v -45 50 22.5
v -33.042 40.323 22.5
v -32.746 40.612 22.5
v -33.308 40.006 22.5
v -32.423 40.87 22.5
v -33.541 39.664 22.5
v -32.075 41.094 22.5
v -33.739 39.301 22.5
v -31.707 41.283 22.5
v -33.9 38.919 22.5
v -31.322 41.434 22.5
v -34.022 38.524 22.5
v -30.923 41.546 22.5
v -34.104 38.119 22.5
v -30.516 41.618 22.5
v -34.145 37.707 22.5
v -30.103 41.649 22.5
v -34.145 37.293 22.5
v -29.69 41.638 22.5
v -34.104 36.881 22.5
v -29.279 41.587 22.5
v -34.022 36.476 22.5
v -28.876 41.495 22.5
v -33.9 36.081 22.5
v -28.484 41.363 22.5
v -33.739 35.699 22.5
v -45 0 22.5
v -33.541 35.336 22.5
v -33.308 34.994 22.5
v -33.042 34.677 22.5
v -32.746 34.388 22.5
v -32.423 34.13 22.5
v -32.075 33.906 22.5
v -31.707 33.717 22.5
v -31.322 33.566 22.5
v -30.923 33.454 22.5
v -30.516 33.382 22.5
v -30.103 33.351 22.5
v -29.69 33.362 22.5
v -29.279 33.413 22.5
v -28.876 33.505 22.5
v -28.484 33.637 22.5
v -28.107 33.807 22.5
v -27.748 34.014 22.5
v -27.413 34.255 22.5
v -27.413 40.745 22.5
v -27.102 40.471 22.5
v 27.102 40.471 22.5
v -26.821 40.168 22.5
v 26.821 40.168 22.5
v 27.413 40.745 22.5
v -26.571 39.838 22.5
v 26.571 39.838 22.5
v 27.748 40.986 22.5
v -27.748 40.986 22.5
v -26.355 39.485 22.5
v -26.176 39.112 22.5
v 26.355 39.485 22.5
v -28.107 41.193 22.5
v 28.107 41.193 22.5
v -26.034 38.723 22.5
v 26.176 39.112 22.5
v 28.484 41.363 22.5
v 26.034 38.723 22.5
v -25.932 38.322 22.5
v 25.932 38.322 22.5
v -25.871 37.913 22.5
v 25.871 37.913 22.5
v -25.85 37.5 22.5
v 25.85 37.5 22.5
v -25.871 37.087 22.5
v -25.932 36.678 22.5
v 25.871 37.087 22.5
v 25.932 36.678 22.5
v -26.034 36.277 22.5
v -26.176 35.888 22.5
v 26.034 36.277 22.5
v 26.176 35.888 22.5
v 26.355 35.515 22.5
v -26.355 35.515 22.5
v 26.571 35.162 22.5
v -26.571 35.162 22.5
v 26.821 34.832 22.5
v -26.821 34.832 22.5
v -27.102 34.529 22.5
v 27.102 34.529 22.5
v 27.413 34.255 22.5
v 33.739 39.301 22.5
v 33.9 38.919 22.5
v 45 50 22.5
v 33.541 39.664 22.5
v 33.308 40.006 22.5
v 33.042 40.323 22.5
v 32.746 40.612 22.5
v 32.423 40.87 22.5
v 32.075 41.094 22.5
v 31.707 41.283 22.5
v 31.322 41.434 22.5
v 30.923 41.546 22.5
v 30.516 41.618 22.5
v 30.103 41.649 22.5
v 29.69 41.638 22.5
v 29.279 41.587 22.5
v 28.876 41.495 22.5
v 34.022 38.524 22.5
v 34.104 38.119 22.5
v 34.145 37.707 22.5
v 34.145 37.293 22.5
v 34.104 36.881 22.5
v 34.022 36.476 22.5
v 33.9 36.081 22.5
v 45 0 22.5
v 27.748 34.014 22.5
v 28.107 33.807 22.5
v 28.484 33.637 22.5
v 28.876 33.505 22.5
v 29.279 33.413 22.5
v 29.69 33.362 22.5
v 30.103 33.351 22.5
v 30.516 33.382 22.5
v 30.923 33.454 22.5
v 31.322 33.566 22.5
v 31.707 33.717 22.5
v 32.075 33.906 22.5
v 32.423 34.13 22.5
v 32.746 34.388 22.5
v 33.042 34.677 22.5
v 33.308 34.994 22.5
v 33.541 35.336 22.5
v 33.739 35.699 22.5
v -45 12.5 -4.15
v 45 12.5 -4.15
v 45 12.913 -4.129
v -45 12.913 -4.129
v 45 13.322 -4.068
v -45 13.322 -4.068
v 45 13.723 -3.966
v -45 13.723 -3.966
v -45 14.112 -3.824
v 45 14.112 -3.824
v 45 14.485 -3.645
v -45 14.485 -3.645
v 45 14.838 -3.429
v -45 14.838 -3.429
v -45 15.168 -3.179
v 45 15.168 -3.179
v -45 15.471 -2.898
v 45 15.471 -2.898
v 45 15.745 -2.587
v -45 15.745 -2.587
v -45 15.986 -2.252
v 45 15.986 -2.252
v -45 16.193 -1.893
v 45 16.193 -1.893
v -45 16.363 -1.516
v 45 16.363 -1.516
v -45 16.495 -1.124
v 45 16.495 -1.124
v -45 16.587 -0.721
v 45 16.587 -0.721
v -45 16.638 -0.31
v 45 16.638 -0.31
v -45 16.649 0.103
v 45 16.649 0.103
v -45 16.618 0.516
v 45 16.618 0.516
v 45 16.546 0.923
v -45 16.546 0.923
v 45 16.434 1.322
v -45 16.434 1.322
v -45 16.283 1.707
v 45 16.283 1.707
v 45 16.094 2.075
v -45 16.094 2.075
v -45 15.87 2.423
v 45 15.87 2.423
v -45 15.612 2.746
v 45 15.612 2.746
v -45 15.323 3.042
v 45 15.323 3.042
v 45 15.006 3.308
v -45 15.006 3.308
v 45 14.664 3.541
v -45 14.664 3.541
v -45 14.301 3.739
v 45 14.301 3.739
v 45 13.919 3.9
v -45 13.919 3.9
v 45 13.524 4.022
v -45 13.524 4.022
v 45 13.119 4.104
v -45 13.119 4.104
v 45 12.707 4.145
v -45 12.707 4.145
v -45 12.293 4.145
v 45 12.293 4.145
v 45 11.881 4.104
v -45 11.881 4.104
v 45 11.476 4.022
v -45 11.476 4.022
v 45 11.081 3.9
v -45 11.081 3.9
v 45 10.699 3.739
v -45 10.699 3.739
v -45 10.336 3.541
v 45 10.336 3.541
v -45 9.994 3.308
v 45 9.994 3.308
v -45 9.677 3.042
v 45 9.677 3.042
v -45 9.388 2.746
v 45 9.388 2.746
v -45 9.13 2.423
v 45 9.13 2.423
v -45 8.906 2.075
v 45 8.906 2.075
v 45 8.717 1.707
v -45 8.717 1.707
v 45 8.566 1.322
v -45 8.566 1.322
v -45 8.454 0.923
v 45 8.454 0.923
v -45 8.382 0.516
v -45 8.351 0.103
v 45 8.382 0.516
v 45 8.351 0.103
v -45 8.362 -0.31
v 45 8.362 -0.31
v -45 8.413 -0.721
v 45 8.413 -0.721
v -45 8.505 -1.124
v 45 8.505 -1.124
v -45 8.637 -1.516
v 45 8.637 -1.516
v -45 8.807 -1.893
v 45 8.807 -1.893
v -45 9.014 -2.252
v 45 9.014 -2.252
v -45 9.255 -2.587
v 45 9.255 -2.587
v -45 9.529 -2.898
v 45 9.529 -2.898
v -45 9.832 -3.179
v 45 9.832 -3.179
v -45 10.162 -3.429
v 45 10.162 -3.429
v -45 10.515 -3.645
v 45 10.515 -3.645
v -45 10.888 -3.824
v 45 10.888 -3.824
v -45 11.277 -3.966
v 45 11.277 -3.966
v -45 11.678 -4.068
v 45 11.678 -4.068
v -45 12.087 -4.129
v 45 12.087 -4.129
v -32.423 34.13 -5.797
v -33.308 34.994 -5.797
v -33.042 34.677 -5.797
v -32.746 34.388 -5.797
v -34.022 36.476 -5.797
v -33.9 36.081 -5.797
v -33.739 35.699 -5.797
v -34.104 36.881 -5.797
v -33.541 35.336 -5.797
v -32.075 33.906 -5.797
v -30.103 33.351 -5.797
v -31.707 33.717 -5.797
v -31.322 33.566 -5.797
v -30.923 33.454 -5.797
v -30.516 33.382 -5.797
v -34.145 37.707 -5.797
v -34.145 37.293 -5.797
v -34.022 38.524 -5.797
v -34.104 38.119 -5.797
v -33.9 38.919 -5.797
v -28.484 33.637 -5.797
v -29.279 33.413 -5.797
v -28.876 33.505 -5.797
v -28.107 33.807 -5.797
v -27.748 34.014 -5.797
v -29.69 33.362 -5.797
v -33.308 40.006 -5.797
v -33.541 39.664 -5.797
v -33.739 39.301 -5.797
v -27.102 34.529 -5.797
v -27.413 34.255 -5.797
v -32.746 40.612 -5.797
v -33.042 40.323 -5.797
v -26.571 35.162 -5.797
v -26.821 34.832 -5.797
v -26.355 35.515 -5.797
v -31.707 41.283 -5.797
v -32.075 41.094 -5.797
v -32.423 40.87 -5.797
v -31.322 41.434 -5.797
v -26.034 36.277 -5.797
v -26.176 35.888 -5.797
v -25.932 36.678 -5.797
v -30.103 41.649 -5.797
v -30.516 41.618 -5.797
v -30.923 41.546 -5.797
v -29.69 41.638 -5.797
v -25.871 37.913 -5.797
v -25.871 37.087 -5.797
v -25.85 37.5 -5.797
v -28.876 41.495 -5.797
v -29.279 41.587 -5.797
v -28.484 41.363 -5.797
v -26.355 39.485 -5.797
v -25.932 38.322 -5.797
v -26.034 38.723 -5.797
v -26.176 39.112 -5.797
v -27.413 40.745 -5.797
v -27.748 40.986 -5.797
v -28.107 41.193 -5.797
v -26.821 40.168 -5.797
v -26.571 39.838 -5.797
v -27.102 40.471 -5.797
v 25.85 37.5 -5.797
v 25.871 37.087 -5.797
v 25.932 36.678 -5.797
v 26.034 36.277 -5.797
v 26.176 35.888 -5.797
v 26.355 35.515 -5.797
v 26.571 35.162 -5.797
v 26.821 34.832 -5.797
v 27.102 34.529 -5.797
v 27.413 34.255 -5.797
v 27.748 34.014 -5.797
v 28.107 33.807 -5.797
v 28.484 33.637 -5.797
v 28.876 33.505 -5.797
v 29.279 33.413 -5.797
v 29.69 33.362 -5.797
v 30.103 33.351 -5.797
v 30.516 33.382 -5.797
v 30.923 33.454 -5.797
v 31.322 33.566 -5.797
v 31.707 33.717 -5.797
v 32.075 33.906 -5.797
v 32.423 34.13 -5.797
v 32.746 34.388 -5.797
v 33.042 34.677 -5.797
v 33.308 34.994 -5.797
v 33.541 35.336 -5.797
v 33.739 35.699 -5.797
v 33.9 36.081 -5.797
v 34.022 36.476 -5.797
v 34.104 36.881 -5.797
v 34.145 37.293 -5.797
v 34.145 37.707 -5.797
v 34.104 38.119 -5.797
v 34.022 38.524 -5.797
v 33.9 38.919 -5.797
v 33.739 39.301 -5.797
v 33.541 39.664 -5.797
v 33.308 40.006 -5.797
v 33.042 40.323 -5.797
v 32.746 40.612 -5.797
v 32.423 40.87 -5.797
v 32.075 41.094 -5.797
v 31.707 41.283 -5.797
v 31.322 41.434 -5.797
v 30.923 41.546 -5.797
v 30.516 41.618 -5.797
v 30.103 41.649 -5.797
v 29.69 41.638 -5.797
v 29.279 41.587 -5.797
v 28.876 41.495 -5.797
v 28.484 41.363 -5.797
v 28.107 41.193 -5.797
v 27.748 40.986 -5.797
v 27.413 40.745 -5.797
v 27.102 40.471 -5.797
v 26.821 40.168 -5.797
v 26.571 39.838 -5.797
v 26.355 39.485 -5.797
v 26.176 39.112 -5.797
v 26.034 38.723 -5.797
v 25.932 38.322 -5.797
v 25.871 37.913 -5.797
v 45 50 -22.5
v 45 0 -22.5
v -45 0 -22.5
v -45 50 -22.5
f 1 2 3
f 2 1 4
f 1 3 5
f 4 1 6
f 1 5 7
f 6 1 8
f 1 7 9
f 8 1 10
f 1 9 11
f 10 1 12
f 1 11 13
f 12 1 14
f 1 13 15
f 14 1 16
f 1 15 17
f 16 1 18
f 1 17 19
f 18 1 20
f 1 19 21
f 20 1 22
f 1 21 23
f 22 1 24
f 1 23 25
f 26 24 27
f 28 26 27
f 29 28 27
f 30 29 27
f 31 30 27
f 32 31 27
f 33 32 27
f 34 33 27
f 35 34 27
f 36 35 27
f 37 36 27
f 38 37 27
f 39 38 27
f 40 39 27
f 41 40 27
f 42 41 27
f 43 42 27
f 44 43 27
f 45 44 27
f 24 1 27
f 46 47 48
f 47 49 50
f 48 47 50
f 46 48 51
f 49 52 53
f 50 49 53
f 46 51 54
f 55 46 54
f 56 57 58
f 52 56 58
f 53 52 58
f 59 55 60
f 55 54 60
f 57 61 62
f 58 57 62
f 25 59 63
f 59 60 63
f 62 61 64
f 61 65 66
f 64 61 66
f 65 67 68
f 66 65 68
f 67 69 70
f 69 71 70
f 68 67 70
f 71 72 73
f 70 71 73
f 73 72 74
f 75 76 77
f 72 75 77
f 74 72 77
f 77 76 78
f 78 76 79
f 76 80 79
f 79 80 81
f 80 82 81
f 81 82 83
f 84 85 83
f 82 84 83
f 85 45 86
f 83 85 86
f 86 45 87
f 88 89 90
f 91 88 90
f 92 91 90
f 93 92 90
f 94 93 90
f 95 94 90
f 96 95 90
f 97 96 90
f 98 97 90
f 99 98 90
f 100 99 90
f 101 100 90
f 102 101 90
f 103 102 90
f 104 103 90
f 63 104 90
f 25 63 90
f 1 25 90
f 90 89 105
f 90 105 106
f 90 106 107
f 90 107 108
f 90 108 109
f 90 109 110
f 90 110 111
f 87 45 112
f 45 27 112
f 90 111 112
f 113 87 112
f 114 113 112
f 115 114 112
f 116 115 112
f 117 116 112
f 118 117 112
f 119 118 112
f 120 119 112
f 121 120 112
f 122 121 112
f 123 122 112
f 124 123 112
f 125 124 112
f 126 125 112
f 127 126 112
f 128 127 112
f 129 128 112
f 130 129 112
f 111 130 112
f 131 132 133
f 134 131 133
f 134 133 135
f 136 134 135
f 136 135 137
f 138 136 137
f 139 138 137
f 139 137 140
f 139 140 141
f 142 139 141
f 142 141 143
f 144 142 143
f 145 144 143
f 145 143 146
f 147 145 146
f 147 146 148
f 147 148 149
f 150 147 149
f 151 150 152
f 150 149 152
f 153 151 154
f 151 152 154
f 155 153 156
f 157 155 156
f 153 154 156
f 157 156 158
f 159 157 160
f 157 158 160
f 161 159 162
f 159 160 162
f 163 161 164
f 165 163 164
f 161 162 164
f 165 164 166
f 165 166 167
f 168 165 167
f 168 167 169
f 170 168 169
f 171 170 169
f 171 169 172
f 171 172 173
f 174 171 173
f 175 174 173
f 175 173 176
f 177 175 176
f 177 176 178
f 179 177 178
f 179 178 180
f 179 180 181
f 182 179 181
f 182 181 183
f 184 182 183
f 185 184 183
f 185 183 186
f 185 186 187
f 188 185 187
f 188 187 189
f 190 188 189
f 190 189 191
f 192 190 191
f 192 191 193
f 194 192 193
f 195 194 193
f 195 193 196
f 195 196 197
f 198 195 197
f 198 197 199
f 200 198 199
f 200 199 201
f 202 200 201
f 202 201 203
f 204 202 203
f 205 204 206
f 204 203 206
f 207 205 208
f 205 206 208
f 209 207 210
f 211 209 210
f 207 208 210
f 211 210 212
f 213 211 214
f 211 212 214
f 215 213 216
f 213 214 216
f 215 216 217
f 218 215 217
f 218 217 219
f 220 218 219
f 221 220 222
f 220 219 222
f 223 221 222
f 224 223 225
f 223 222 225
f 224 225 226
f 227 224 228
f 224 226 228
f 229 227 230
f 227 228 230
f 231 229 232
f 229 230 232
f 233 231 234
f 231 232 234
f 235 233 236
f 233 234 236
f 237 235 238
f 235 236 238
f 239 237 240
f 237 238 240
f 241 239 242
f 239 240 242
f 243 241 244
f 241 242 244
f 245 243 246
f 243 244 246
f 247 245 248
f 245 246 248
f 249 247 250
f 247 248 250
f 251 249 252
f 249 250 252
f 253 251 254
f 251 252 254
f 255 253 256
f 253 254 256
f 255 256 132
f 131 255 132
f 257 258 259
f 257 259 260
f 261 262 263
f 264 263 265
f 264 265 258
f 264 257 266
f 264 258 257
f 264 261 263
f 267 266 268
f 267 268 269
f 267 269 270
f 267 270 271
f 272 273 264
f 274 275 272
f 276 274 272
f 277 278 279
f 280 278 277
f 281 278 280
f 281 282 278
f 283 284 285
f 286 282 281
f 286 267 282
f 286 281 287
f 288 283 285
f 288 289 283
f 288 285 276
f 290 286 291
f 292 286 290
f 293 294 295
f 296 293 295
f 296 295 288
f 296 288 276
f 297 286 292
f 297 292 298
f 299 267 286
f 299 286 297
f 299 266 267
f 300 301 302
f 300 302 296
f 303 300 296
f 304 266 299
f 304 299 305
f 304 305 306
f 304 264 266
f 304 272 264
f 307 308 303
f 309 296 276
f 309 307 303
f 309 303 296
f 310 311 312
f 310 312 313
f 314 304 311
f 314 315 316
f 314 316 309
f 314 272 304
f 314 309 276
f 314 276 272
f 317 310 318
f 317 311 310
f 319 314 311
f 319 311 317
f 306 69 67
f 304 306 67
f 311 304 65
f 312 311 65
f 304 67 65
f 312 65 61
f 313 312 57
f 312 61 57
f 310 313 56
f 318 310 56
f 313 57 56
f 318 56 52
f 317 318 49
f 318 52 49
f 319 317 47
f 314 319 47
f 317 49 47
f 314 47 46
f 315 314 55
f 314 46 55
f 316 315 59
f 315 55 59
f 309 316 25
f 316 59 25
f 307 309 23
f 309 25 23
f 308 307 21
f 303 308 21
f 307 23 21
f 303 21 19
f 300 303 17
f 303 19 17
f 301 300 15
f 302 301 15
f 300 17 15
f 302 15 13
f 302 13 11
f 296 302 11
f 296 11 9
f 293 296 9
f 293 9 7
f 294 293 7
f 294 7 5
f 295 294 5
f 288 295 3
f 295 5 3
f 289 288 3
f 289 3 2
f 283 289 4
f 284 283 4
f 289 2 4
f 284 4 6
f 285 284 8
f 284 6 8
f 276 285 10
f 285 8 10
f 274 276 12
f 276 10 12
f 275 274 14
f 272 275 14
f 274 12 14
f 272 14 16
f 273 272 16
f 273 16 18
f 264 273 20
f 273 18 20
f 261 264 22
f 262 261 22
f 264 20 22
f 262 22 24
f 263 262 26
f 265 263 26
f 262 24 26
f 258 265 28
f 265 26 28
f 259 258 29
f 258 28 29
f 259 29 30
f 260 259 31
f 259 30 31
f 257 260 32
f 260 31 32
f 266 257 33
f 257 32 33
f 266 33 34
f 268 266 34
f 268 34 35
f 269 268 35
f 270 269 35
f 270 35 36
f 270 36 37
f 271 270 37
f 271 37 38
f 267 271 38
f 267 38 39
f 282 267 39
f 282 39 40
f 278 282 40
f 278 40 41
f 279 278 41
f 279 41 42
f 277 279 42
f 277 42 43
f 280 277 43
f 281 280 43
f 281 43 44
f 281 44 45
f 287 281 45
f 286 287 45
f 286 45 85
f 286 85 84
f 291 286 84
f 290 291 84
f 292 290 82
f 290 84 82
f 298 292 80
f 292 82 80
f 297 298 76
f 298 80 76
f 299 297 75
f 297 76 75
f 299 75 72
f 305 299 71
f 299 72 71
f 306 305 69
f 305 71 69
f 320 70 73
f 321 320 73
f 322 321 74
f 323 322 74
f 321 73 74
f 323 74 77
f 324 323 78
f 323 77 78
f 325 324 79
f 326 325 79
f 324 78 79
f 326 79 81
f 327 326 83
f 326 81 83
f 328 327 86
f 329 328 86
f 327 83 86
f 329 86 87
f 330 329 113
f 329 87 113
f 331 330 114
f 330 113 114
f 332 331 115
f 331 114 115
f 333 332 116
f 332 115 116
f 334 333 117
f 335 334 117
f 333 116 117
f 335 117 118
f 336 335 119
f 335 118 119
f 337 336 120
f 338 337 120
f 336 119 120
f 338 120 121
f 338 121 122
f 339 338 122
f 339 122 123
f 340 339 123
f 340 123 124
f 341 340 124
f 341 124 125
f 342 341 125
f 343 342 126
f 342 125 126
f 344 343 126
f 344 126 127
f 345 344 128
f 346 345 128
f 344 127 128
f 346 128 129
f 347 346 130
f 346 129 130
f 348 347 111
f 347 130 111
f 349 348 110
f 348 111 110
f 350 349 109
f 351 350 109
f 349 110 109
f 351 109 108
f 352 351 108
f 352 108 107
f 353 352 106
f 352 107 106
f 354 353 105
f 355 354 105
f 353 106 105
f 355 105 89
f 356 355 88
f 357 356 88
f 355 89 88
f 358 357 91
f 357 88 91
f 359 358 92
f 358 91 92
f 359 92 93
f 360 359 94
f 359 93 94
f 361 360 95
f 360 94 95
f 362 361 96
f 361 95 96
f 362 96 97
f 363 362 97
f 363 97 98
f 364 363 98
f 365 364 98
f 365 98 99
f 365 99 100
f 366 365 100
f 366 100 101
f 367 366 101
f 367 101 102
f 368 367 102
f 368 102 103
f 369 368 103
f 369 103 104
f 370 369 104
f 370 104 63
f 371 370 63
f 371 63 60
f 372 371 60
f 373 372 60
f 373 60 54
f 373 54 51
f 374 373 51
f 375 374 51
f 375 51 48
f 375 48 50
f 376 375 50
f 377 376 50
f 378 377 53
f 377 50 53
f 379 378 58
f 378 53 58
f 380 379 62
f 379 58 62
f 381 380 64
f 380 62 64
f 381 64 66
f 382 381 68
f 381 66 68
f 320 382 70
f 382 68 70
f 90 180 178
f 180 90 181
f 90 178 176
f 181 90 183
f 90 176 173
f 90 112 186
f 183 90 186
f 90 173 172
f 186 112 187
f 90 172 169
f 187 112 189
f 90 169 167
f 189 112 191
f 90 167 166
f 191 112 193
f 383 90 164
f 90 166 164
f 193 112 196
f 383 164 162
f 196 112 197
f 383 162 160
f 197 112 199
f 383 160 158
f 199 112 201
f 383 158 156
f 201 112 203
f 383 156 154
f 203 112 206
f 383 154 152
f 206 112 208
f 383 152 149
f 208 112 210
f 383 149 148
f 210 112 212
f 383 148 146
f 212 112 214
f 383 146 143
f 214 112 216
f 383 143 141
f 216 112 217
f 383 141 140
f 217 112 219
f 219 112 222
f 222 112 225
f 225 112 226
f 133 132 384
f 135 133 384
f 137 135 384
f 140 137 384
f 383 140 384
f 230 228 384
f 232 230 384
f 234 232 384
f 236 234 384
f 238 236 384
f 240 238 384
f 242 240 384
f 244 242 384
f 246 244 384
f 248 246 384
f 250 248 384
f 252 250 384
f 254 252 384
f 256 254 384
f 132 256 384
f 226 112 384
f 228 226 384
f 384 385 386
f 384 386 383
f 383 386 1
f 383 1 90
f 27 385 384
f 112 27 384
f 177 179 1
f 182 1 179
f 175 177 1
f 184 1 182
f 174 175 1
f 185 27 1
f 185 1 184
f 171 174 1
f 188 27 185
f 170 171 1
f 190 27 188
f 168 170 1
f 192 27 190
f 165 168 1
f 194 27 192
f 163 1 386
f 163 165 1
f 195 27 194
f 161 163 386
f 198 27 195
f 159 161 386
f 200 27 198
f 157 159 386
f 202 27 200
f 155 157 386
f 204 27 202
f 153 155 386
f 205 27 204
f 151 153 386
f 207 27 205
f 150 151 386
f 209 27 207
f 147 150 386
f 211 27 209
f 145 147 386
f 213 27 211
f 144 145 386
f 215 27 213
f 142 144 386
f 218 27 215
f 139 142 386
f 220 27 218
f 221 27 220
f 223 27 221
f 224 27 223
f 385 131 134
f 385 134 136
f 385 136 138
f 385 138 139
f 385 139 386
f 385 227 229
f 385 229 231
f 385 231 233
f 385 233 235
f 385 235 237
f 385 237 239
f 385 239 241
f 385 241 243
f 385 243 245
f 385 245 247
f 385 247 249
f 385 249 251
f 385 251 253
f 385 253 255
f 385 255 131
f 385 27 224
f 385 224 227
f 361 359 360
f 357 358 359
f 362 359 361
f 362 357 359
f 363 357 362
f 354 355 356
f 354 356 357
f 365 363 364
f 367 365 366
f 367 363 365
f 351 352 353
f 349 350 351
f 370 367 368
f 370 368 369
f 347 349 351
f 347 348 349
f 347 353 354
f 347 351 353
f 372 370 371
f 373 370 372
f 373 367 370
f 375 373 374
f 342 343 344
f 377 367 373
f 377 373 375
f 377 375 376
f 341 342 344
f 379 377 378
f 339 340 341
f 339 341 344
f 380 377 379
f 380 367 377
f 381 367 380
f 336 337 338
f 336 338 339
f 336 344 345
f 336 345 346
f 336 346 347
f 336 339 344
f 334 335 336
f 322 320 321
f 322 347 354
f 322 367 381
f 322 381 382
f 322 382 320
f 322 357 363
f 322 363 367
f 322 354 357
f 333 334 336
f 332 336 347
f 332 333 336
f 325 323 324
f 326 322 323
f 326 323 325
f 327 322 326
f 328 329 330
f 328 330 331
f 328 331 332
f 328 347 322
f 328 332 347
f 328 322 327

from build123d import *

# Parameters (mm, degrees)
SKETCH1_W           = 90
SKETCH1_H           = 45
BOSS_EXTRUDE1_DEPTH = 50
SKETCH2_R           = 4.15
CUT_EXTRUDE1_DEPTH  = 28.296664924
SKETCH3_R           = 4.15
CUT_EXTRUDE2_DEPTH  = 106.386194542


with BuildPart() as part:
    # Sketch1 → Boss-Extrude1 (new body)
    with BuildSketch(Plane(origin=(0, 0, 0), x_dir=(1, 0, 0), z_dir=(0, 1, 0))):
        Rectangle(SKETCH1_W, SKETCH1_H)
    extrude(amount=BOSS_EXTRUDE1_DEPTH)

    # Sketch2 → Cut-Extrude1 (cut)
    with BuildSketch(Plane.XY.offset(22.5)):
        with Locations((-30, 37.5)):
            Circle(SKETCH2_R)
        with Locations(Location((30, 37.5, 0), (0, 0, 180))):
            Circle(SKETCH2_R)
    extrude(amount=-CUT_EXTRUDE1_DEPTH, mode=Mode.SUBTRACT)

    # Sketch3 → Cut-Extrude2 (cut, through all)
    with BuildSketch(Plane(origin=(45, 0, 0), x_dir=(0, 0, -1), z_dir=(1, 0, 0))):
        with Locations((0, 12.5)):
            Circle(SKETCH3_R)
    extrude(amount=-CUT_EXTRUDE2_DEPTH, mode=Mode.SUBTRACT)


solid = part.part
